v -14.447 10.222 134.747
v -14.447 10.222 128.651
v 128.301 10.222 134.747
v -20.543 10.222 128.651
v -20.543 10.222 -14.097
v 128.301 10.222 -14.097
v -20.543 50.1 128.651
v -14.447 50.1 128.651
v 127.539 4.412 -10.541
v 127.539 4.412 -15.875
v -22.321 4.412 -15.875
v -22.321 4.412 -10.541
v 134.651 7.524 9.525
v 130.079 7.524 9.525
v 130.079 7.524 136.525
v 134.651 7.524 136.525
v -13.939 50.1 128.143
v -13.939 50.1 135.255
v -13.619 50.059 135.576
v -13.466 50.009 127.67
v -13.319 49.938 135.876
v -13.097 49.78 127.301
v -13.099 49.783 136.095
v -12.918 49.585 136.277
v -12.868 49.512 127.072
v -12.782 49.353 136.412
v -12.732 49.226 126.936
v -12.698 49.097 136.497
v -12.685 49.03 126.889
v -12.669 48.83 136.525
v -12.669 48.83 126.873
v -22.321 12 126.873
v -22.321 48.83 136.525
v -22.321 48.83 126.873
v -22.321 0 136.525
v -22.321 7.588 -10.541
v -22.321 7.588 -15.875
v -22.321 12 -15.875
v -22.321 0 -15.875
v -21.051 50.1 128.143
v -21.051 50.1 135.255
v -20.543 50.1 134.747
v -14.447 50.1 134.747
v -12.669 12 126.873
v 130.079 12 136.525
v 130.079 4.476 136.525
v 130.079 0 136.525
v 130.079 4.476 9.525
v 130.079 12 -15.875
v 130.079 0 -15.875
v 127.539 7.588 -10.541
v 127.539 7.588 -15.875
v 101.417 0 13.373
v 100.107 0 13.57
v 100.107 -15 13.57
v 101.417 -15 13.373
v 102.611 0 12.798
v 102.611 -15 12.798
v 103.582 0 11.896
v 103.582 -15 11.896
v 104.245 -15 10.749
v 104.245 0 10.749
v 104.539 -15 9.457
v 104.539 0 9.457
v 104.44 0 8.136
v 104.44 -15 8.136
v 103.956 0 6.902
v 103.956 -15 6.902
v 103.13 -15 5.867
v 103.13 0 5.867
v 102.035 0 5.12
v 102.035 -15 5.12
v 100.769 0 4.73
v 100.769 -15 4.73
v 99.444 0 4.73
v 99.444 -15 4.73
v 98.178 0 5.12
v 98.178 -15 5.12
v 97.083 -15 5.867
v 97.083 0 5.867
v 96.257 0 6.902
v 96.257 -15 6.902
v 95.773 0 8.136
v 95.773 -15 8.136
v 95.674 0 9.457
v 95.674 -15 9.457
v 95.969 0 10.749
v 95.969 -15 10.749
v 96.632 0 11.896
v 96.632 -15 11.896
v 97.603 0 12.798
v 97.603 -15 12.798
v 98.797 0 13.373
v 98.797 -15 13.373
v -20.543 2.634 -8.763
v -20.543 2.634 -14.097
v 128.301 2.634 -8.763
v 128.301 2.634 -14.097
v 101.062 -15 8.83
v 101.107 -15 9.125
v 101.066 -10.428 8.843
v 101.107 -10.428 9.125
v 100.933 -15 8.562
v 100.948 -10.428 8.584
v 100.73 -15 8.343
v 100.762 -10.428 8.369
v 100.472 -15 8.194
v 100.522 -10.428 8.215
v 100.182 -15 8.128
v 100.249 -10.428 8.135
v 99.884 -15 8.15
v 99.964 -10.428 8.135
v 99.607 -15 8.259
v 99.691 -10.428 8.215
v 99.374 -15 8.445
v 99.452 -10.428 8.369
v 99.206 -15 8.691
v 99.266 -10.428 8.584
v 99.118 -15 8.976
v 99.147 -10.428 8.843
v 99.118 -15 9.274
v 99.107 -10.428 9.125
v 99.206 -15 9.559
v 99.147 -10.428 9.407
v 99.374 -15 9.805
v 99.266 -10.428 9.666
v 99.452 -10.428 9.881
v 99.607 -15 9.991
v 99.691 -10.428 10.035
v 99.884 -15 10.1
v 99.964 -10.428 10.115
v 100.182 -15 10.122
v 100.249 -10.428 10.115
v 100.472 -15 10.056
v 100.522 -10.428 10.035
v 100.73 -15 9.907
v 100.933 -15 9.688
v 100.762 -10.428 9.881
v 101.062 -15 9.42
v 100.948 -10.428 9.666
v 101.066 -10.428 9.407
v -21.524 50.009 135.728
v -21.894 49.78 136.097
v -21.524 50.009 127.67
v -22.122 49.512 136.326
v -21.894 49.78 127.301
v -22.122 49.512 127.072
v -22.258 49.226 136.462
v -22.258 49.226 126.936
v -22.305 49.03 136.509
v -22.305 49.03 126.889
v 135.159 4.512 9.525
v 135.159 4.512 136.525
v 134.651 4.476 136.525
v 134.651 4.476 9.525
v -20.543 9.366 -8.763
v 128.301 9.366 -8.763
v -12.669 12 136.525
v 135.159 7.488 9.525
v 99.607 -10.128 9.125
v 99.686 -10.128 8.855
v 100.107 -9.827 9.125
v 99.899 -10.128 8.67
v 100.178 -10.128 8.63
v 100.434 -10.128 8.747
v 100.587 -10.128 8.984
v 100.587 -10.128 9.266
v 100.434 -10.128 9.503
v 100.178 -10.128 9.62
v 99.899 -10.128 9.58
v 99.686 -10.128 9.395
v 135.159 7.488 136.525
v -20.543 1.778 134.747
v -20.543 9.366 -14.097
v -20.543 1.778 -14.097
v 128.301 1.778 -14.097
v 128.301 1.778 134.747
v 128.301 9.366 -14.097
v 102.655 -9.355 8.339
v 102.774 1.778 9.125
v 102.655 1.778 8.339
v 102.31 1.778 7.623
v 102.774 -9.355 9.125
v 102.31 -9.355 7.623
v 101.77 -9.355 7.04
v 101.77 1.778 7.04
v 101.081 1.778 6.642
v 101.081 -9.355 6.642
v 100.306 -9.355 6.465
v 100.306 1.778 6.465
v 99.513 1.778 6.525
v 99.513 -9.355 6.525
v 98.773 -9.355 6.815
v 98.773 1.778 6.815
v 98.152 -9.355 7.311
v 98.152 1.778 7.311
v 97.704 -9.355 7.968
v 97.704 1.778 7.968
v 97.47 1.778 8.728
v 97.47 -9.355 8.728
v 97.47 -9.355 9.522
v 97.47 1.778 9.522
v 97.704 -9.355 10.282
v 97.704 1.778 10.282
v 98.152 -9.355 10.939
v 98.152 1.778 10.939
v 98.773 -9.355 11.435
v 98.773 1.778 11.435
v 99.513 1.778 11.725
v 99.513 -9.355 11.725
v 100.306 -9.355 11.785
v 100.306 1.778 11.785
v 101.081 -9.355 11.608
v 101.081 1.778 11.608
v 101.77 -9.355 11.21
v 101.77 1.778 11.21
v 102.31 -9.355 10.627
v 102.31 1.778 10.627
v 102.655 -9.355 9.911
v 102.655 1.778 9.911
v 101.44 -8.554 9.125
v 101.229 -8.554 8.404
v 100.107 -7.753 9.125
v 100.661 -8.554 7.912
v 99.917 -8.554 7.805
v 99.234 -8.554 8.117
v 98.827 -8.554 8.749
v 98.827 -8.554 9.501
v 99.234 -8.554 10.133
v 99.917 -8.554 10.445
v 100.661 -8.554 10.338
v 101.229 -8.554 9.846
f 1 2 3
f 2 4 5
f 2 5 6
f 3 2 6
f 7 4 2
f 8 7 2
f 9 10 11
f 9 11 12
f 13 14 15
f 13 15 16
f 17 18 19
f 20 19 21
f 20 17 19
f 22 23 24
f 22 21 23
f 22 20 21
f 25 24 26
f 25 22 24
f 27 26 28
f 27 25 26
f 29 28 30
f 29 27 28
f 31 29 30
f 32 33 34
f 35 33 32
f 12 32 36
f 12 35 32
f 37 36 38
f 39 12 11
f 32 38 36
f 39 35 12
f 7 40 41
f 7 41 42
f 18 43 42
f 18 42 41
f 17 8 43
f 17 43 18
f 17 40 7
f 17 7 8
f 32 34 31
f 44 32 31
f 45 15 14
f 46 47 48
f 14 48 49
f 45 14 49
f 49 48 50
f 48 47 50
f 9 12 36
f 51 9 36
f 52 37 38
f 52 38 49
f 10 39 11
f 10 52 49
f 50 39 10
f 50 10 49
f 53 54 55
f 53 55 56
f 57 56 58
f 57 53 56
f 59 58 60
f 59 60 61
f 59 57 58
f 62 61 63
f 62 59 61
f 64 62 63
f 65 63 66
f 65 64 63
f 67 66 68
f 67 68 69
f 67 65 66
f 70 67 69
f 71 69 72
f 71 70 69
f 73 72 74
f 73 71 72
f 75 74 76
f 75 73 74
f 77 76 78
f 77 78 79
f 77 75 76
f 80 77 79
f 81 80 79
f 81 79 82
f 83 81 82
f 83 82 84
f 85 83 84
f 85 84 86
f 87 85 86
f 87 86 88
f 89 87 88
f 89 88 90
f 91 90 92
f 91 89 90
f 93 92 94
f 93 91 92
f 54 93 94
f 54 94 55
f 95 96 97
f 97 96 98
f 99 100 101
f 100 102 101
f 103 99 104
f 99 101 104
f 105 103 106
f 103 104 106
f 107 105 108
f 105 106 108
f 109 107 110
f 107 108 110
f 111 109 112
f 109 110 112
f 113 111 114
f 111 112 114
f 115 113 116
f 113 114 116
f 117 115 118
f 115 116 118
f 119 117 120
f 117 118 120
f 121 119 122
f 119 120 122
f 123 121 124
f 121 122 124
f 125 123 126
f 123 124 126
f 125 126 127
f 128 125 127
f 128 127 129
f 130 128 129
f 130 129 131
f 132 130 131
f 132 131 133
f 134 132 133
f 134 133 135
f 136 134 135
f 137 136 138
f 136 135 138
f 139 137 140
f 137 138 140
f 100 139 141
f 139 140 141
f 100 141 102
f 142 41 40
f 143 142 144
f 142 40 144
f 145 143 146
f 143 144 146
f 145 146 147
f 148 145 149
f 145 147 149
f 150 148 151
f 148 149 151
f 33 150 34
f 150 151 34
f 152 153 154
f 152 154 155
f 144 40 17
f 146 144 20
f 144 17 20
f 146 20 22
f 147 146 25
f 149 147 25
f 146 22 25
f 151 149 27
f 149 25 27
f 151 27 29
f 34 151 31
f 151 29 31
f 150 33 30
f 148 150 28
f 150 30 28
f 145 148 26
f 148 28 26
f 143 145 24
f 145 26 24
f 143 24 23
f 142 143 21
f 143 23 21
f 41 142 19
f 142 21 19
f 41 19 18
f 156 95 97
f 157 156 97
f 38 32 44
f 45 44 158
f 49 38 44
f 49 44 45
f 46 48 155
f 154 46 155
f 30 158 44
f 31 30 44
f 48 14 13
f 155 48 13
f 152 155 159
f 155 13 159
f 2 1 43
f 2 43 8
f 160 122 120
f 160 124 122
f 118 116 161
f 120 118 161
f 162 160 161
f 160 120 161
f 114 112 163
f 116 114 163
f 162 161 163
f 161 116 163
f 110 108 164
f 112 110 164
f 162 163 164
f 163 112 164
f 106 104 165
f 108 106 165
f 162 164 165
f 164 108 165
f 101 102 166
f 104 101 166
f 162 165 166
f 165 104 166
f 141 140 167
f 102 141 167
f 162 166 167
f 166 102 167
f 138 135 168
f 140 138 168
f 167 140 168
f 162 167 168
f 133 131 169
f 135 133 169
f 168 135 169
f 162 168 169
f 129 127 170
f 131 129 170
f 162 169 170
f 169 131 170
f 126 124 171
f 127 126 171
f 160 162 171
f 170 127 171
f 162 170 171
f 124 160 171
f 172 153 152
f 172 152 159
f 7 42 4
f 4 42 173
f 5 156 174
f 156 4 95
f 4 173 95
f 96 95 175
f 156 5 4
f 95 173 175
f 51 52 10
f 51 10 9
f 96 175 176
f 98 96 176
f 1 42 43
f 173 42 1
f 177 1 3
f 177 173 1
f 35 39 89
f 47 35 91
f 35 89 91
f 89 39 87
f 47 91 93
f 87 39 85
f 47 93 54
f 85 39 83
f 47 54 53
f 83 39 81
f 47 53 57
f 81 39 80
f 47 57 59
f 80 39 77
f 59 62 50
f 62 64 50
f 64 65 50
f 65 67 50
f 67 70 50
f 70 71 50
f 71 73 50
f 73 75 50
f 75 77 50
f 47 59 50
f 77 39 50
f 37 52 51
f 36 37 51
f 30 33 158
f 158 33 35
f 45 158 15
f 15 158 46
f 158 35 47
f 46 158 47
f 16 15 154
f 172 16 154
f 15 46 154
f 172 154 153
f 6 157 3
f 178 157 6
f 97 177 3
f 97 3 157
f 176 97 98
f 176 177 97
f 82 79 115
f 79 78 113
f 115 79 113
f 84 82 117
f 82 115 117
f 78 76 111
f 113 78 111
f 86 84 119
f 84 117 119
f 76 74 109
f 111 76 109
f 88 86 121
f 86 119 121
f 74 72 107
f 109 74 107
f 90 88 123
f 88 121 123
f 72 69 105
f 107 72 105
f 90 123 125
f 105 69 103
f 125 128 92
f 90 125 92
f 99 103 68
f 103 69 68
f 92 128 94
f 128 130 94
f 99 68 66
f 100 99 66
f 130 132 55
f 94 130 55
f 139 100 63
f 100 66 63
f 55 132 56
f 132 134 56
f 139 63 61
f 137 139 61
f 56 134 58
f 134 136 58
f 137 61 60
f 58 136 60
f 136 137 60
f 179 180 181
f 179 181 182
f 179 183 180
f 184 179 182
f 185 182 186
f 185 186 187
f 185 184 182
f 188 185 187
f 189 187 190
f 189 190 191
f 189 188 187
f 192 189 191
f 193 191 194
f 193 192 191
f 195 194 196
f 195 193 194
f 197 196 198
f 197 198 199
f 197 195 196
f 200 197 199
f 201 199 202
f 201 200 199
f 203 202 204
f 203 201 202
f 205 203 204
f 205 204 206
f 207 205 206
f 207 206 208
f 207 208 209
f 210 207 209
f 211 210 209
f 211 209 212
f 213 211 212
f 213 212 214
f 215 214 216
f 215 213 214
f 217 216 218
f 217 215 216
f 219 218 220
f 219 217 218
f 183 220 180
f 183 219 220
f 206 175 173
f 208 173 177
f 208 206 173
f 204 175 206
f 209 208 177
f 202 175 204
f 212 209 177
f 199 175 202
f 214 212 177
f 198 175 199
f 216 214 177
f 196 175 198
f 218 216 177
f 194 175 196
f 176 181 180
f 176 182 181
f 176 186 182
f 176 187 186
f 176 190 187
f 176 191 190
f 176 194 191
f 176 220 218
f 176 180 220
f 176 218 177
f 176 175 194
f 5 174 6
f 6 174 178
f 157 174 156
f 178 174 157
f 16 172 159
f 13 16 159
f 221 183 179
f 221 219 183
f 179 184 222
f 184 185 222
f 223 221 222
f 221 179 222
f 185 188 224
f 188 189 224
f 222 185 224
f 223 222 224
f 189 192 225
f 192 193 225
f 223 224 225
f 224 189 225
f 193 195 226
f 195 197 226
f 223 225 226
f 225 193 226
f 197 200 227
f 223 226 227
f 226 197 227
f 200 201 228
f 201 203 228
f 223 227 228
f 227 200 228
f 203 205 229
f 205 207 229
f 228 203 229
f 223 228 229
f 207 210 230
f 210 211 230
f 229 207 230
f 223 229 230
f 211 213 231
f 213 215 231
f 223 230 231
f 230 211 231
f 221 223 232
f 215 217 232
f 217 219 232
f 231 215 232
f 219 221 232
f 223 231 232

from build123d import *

# Parameters (mm, degrees)
SKETCH1_W                 = 152.4
SKETCH1_H                 = 152.4
BOSS_EXTRUDE2_DEPTH       = 12
SKETCH2_W                 = 9.652
SKETCH2_H                 = 9.652
BOSS_EXTRUDE3_DEPTH       = 38.1
SKETCH3_W                 = 5.08
SKETCH3_H                 = 3.048
BOSS_EXTRUDE4_DEPTH       = 127
CHAMFER1_SIZE             = 0.508
CHAMFER1_SIZE2            = 0.03552282
CHAMFER2_SIZE             = 0.508
CHAMFER2_SIZE2            = 0.03552282
SKETCH4_W                 = 5.334
SKETCH4_H                 = 3.175
CUT_EXTRUDE3_DEPTH        = 149.86
SKETCH5_R                 = 4.445
BOSS_EXTRUDE5_DEPTH       = 15
F_2_0MM_DOWEL_HOLE1_D     = 2
F_2_0MM_DOWEL_HOLE1_DEPTH = 4.572
F_2_0MM_DOWEL_HOLE1_TIP   = 0.600860619
SHELL1_START              = 1.778
SHELL1_OUTLINE_W          = 148.844
SHELL1_OUTLINE_H          = 143.51
SHELL1_DEPTH              = 8.444
SHELL1_START_2            = 10.222
SHELL1_2_OUTLINE_W        = 6.096
SHELL1_2_OUTLINE_H        = 6.096
SHELL1_2_DEPTH            = 39.878
SHELL1_3_OUTLINE_W        = 148.844
SHELL1_3_OUTLINE_H        = 5.334
SHELL1_3_DEPTH            = 0.8565
SHELL1_START_3            = 9.3655
SHELL1_4_OUTLINE_W        = 148.844
SHELL1_4_OUTLINE_H        = 5.334
SHELL1_4_DEPTH            = 0.8565
SHELL1_START_4            = -7.752865101
SHELL1_5_OUTLINE_R        = 2.667
SHELL1_5_DEPTH            = 9.530865101
FILLET1_R                 = 1.27


with BuildPart() as part:
    # Sketch1 → Boss-Extrude2 (new body)
    with BuildSketch(Plane(origin=(0, 0, 0), x_dir=(1, 0, 0), z_dir=(0, 1, 0))):
        with Locations((53.878787879, -60.325)):
            Rectangle(SKETCH1_W, SKETCH1_H)
    extrude(amount=BOSS_EXTRUDE2_DEPTH)

    # Sketch2 → Boss-Extrude3 (add)
    with BuildSketch(Plane(origin=(0, 12, 0), x_dir=(1, 0, 0), z_dir=(0, 1, 0))):
        with Locations((-17.495212121, -131.699)):
            Rectangle(SKETCH2_W, SKETCH2_H)
    extrude(amount=BOSS_EXTRUDE3_DEPTH)

    # Sketch3 → Boss-Extrude4 (add)
    with BuildSketch(Plane.XY.offset(136.525)):
        with Locations((132.618787879, 6)):
            Rectangle(SKETCH3_W, SKETCH3_H)
    extrude(amount=-BOSS_EXTRUDE4_DEPTH)

    # Chamfer1
    chamfer1_edges = [part.edges().sort_by_distance(p)[0] for p in [
        (135.158787879, 7.524, 73.025),
    ]]
    chamfer1_side = [part.faces().sort_by_distance(p)[0] for p in [
        (132.618787879, 7.524, 73.025),
    ]]
    chamfer(chamfer1_edges, length=CHAMFER1_SIZE, length2=CHAMFER1_SIZE2, reference=chamfer1_side[0])

    # Chamfer2
    chamfer2_edges = [part.edges().sort_by_distance(p)[0] for p in [
        (135.158787879, 4.476, 73.025),
    ]]
    chamfer2_side = [part.faces().sort_by_distance(p)[0] for p in [
        (132.618787879, 4.476, 73.025),
    ]]
    chamfer(chamfer2_edges, length=CHAMFER2_SIZE, length2=CHAMFER2_SIZE2, reference=chamfer2_side[0])

    # Sketch4 → Cut-Extrude3 (cut)
    with BuildSketch(Plane.ZY.offset(22.321212121)):
        with Locations((-13.208, 6)):
            Rectangle(SKETCH4_W, SKETCH4_H)
    extrude(amount=-CUT_EXTRUDE3_DEPTH, mode=Mode.SUBTRACT)

    # Sketch5 → Boss-Extrude5 (add)
    with BuildSketch(Plane(origin=(0, 0, 0), x_dir=(1, 0, 0), z_dir=(0, 1, 0))):
        with Locations(Location((100.106787879, -9.125, 0), (0, 0, 270))):
            Circle(SKETCH5_R)
    extrude(amount=-BOSS_EXTRUDE5_DEPTH)

    # Ø2.0mm Dowel Hole1
    with Locations(Plane(origin=(0, -15, 0), x_dir=(-1, 0, 0), z_dir=(0, -1, 0))):
        with Locations((-100.106787879, -9.125)):
            Hole(F_2_0MM_DOWEL_HOLE1_D / 2, depth=F_2_0MM_DOWEL_HOLE1_DEPTH)
            with Locations((0, 0, -(F_2_0MM_DOWEL_HOLE1_DEPTH + F_2_0MM_DOWEL_HOLE1_TIP / 2))):  # 118° drill point
                Cone(0, F_2_0MM_DOWEL_HOLE1_D / 2, F_2_0MM_DOWEL_HOLE1_TIP, mode=Mode.SUBTRACT)

    # Shell1: read off the stored shape, not the designer's step
    # Shell1 outline → Shell1 (cut)
    with BuildSketch(Plane(origin=(0, 0, 0), x_dir=(1, 0, 0), z_dir=(0, 1, 0)).offset(SHELL1_START)):
        with Locations((53.878787879, -62.992)):
            Rectangle(SHELL1_OUTLINE_W, SHELL1_OUTLINE_H)
    extrude(amount=SHELL1_DEPTH, mode=Mode.SUBTRACT)

    # Shell1 2 outline → Shell1 2 (cut)
    with BuildSketch(Plane(origin=(0, 0, 0), x_dir=(1, 0, 0), z_dir=(0, 1, 0)).offset(SHELL1_START_2)):
        with Locations((-17.495212121, -131.699)):
            Rectangle(SHELL1_2_OUTLINE_W, SHELL1_2_OUTLINE_H)
    extrude(amount=SHELL1_2_DEPTH, mode=Mode.SUBTRACT)

    # Shell1 3 outline → Shell1 3 (cut)
    with BuildSketch(Plane(origin=(0, 0, 0), x_dir=(1, 0, 0), z_dir=(0, 1, 0)).offset(SHELL1_START)):
        with Locations((53.878787879, 11.43)):
            Rectangle(SHELL1_3_OUTLINE_W, SHELL1_3_OUTLINE_H)
    extrude(amount=SHELL1_3_DEPTH, mode=Mode.SUBTRACT)

    # Shell1 4 outline → Shell1 4 (cut)
    with BuildSketch(Plane(origin=(0, 0, 0), x_dir=(1, 0, 0), z_dir=(0, 1, 0)).offset(SHELL1_START_3)):
        with Locations((53.878787879, 11.43)):
            Rectangle(SHELL1_4_OUTLINE_W, SHELL1_4_OUTLINE_H)
    extrude(amount=SHELL1_4_DEPTH, mode=Mode.SUBTRACT)

    # Shell1 5 outline → Shell1 5 (cut)
    with BuildSketch(Plane(origin=(0, 0, 0), x_dir=(1, 0, 0), z_dir=(0, 1, 0)).offset(SHELL1_START_4)):
        with Locations((100.106787879, -9.125)):
            Circle(SHELL1_5_OUTLINE_R)
    extrude(amount=SHELL1_5_DEPTH, mode=Mode.SUBTRACT)

    # Shell1 6 outline → Shell1 6 (revolve, cut)
    with BuildSketch(Plane(origin=(100.106787879, 0, 9.125), x_dir=(1, 0, 0), z_dir=(0, 0, 1))):
        Polygon((0, -7.752865201), (2.667, -9.355360472), (2.667, -7.752865101), align=None)
    revolve(axis=Axis((100.106787879, 0, 9.125), (0, 1, 0)), mode=Mode.SUBTRACT)

    # Fillet1
    fillet1_edges = [part.edges().sort_by_distance(p)[0] for p in [
        (-22.321212121, 50.1, 131.699),
        (-17.495212121, 50.1, 136.525),
        (-12.669212121, 50.1, 131.699),
        (-17.495212121, 50.1, 126.873),
    ]]
    fillet(fillet1_edges, radius=FILLET1_R)


solid = part.part
